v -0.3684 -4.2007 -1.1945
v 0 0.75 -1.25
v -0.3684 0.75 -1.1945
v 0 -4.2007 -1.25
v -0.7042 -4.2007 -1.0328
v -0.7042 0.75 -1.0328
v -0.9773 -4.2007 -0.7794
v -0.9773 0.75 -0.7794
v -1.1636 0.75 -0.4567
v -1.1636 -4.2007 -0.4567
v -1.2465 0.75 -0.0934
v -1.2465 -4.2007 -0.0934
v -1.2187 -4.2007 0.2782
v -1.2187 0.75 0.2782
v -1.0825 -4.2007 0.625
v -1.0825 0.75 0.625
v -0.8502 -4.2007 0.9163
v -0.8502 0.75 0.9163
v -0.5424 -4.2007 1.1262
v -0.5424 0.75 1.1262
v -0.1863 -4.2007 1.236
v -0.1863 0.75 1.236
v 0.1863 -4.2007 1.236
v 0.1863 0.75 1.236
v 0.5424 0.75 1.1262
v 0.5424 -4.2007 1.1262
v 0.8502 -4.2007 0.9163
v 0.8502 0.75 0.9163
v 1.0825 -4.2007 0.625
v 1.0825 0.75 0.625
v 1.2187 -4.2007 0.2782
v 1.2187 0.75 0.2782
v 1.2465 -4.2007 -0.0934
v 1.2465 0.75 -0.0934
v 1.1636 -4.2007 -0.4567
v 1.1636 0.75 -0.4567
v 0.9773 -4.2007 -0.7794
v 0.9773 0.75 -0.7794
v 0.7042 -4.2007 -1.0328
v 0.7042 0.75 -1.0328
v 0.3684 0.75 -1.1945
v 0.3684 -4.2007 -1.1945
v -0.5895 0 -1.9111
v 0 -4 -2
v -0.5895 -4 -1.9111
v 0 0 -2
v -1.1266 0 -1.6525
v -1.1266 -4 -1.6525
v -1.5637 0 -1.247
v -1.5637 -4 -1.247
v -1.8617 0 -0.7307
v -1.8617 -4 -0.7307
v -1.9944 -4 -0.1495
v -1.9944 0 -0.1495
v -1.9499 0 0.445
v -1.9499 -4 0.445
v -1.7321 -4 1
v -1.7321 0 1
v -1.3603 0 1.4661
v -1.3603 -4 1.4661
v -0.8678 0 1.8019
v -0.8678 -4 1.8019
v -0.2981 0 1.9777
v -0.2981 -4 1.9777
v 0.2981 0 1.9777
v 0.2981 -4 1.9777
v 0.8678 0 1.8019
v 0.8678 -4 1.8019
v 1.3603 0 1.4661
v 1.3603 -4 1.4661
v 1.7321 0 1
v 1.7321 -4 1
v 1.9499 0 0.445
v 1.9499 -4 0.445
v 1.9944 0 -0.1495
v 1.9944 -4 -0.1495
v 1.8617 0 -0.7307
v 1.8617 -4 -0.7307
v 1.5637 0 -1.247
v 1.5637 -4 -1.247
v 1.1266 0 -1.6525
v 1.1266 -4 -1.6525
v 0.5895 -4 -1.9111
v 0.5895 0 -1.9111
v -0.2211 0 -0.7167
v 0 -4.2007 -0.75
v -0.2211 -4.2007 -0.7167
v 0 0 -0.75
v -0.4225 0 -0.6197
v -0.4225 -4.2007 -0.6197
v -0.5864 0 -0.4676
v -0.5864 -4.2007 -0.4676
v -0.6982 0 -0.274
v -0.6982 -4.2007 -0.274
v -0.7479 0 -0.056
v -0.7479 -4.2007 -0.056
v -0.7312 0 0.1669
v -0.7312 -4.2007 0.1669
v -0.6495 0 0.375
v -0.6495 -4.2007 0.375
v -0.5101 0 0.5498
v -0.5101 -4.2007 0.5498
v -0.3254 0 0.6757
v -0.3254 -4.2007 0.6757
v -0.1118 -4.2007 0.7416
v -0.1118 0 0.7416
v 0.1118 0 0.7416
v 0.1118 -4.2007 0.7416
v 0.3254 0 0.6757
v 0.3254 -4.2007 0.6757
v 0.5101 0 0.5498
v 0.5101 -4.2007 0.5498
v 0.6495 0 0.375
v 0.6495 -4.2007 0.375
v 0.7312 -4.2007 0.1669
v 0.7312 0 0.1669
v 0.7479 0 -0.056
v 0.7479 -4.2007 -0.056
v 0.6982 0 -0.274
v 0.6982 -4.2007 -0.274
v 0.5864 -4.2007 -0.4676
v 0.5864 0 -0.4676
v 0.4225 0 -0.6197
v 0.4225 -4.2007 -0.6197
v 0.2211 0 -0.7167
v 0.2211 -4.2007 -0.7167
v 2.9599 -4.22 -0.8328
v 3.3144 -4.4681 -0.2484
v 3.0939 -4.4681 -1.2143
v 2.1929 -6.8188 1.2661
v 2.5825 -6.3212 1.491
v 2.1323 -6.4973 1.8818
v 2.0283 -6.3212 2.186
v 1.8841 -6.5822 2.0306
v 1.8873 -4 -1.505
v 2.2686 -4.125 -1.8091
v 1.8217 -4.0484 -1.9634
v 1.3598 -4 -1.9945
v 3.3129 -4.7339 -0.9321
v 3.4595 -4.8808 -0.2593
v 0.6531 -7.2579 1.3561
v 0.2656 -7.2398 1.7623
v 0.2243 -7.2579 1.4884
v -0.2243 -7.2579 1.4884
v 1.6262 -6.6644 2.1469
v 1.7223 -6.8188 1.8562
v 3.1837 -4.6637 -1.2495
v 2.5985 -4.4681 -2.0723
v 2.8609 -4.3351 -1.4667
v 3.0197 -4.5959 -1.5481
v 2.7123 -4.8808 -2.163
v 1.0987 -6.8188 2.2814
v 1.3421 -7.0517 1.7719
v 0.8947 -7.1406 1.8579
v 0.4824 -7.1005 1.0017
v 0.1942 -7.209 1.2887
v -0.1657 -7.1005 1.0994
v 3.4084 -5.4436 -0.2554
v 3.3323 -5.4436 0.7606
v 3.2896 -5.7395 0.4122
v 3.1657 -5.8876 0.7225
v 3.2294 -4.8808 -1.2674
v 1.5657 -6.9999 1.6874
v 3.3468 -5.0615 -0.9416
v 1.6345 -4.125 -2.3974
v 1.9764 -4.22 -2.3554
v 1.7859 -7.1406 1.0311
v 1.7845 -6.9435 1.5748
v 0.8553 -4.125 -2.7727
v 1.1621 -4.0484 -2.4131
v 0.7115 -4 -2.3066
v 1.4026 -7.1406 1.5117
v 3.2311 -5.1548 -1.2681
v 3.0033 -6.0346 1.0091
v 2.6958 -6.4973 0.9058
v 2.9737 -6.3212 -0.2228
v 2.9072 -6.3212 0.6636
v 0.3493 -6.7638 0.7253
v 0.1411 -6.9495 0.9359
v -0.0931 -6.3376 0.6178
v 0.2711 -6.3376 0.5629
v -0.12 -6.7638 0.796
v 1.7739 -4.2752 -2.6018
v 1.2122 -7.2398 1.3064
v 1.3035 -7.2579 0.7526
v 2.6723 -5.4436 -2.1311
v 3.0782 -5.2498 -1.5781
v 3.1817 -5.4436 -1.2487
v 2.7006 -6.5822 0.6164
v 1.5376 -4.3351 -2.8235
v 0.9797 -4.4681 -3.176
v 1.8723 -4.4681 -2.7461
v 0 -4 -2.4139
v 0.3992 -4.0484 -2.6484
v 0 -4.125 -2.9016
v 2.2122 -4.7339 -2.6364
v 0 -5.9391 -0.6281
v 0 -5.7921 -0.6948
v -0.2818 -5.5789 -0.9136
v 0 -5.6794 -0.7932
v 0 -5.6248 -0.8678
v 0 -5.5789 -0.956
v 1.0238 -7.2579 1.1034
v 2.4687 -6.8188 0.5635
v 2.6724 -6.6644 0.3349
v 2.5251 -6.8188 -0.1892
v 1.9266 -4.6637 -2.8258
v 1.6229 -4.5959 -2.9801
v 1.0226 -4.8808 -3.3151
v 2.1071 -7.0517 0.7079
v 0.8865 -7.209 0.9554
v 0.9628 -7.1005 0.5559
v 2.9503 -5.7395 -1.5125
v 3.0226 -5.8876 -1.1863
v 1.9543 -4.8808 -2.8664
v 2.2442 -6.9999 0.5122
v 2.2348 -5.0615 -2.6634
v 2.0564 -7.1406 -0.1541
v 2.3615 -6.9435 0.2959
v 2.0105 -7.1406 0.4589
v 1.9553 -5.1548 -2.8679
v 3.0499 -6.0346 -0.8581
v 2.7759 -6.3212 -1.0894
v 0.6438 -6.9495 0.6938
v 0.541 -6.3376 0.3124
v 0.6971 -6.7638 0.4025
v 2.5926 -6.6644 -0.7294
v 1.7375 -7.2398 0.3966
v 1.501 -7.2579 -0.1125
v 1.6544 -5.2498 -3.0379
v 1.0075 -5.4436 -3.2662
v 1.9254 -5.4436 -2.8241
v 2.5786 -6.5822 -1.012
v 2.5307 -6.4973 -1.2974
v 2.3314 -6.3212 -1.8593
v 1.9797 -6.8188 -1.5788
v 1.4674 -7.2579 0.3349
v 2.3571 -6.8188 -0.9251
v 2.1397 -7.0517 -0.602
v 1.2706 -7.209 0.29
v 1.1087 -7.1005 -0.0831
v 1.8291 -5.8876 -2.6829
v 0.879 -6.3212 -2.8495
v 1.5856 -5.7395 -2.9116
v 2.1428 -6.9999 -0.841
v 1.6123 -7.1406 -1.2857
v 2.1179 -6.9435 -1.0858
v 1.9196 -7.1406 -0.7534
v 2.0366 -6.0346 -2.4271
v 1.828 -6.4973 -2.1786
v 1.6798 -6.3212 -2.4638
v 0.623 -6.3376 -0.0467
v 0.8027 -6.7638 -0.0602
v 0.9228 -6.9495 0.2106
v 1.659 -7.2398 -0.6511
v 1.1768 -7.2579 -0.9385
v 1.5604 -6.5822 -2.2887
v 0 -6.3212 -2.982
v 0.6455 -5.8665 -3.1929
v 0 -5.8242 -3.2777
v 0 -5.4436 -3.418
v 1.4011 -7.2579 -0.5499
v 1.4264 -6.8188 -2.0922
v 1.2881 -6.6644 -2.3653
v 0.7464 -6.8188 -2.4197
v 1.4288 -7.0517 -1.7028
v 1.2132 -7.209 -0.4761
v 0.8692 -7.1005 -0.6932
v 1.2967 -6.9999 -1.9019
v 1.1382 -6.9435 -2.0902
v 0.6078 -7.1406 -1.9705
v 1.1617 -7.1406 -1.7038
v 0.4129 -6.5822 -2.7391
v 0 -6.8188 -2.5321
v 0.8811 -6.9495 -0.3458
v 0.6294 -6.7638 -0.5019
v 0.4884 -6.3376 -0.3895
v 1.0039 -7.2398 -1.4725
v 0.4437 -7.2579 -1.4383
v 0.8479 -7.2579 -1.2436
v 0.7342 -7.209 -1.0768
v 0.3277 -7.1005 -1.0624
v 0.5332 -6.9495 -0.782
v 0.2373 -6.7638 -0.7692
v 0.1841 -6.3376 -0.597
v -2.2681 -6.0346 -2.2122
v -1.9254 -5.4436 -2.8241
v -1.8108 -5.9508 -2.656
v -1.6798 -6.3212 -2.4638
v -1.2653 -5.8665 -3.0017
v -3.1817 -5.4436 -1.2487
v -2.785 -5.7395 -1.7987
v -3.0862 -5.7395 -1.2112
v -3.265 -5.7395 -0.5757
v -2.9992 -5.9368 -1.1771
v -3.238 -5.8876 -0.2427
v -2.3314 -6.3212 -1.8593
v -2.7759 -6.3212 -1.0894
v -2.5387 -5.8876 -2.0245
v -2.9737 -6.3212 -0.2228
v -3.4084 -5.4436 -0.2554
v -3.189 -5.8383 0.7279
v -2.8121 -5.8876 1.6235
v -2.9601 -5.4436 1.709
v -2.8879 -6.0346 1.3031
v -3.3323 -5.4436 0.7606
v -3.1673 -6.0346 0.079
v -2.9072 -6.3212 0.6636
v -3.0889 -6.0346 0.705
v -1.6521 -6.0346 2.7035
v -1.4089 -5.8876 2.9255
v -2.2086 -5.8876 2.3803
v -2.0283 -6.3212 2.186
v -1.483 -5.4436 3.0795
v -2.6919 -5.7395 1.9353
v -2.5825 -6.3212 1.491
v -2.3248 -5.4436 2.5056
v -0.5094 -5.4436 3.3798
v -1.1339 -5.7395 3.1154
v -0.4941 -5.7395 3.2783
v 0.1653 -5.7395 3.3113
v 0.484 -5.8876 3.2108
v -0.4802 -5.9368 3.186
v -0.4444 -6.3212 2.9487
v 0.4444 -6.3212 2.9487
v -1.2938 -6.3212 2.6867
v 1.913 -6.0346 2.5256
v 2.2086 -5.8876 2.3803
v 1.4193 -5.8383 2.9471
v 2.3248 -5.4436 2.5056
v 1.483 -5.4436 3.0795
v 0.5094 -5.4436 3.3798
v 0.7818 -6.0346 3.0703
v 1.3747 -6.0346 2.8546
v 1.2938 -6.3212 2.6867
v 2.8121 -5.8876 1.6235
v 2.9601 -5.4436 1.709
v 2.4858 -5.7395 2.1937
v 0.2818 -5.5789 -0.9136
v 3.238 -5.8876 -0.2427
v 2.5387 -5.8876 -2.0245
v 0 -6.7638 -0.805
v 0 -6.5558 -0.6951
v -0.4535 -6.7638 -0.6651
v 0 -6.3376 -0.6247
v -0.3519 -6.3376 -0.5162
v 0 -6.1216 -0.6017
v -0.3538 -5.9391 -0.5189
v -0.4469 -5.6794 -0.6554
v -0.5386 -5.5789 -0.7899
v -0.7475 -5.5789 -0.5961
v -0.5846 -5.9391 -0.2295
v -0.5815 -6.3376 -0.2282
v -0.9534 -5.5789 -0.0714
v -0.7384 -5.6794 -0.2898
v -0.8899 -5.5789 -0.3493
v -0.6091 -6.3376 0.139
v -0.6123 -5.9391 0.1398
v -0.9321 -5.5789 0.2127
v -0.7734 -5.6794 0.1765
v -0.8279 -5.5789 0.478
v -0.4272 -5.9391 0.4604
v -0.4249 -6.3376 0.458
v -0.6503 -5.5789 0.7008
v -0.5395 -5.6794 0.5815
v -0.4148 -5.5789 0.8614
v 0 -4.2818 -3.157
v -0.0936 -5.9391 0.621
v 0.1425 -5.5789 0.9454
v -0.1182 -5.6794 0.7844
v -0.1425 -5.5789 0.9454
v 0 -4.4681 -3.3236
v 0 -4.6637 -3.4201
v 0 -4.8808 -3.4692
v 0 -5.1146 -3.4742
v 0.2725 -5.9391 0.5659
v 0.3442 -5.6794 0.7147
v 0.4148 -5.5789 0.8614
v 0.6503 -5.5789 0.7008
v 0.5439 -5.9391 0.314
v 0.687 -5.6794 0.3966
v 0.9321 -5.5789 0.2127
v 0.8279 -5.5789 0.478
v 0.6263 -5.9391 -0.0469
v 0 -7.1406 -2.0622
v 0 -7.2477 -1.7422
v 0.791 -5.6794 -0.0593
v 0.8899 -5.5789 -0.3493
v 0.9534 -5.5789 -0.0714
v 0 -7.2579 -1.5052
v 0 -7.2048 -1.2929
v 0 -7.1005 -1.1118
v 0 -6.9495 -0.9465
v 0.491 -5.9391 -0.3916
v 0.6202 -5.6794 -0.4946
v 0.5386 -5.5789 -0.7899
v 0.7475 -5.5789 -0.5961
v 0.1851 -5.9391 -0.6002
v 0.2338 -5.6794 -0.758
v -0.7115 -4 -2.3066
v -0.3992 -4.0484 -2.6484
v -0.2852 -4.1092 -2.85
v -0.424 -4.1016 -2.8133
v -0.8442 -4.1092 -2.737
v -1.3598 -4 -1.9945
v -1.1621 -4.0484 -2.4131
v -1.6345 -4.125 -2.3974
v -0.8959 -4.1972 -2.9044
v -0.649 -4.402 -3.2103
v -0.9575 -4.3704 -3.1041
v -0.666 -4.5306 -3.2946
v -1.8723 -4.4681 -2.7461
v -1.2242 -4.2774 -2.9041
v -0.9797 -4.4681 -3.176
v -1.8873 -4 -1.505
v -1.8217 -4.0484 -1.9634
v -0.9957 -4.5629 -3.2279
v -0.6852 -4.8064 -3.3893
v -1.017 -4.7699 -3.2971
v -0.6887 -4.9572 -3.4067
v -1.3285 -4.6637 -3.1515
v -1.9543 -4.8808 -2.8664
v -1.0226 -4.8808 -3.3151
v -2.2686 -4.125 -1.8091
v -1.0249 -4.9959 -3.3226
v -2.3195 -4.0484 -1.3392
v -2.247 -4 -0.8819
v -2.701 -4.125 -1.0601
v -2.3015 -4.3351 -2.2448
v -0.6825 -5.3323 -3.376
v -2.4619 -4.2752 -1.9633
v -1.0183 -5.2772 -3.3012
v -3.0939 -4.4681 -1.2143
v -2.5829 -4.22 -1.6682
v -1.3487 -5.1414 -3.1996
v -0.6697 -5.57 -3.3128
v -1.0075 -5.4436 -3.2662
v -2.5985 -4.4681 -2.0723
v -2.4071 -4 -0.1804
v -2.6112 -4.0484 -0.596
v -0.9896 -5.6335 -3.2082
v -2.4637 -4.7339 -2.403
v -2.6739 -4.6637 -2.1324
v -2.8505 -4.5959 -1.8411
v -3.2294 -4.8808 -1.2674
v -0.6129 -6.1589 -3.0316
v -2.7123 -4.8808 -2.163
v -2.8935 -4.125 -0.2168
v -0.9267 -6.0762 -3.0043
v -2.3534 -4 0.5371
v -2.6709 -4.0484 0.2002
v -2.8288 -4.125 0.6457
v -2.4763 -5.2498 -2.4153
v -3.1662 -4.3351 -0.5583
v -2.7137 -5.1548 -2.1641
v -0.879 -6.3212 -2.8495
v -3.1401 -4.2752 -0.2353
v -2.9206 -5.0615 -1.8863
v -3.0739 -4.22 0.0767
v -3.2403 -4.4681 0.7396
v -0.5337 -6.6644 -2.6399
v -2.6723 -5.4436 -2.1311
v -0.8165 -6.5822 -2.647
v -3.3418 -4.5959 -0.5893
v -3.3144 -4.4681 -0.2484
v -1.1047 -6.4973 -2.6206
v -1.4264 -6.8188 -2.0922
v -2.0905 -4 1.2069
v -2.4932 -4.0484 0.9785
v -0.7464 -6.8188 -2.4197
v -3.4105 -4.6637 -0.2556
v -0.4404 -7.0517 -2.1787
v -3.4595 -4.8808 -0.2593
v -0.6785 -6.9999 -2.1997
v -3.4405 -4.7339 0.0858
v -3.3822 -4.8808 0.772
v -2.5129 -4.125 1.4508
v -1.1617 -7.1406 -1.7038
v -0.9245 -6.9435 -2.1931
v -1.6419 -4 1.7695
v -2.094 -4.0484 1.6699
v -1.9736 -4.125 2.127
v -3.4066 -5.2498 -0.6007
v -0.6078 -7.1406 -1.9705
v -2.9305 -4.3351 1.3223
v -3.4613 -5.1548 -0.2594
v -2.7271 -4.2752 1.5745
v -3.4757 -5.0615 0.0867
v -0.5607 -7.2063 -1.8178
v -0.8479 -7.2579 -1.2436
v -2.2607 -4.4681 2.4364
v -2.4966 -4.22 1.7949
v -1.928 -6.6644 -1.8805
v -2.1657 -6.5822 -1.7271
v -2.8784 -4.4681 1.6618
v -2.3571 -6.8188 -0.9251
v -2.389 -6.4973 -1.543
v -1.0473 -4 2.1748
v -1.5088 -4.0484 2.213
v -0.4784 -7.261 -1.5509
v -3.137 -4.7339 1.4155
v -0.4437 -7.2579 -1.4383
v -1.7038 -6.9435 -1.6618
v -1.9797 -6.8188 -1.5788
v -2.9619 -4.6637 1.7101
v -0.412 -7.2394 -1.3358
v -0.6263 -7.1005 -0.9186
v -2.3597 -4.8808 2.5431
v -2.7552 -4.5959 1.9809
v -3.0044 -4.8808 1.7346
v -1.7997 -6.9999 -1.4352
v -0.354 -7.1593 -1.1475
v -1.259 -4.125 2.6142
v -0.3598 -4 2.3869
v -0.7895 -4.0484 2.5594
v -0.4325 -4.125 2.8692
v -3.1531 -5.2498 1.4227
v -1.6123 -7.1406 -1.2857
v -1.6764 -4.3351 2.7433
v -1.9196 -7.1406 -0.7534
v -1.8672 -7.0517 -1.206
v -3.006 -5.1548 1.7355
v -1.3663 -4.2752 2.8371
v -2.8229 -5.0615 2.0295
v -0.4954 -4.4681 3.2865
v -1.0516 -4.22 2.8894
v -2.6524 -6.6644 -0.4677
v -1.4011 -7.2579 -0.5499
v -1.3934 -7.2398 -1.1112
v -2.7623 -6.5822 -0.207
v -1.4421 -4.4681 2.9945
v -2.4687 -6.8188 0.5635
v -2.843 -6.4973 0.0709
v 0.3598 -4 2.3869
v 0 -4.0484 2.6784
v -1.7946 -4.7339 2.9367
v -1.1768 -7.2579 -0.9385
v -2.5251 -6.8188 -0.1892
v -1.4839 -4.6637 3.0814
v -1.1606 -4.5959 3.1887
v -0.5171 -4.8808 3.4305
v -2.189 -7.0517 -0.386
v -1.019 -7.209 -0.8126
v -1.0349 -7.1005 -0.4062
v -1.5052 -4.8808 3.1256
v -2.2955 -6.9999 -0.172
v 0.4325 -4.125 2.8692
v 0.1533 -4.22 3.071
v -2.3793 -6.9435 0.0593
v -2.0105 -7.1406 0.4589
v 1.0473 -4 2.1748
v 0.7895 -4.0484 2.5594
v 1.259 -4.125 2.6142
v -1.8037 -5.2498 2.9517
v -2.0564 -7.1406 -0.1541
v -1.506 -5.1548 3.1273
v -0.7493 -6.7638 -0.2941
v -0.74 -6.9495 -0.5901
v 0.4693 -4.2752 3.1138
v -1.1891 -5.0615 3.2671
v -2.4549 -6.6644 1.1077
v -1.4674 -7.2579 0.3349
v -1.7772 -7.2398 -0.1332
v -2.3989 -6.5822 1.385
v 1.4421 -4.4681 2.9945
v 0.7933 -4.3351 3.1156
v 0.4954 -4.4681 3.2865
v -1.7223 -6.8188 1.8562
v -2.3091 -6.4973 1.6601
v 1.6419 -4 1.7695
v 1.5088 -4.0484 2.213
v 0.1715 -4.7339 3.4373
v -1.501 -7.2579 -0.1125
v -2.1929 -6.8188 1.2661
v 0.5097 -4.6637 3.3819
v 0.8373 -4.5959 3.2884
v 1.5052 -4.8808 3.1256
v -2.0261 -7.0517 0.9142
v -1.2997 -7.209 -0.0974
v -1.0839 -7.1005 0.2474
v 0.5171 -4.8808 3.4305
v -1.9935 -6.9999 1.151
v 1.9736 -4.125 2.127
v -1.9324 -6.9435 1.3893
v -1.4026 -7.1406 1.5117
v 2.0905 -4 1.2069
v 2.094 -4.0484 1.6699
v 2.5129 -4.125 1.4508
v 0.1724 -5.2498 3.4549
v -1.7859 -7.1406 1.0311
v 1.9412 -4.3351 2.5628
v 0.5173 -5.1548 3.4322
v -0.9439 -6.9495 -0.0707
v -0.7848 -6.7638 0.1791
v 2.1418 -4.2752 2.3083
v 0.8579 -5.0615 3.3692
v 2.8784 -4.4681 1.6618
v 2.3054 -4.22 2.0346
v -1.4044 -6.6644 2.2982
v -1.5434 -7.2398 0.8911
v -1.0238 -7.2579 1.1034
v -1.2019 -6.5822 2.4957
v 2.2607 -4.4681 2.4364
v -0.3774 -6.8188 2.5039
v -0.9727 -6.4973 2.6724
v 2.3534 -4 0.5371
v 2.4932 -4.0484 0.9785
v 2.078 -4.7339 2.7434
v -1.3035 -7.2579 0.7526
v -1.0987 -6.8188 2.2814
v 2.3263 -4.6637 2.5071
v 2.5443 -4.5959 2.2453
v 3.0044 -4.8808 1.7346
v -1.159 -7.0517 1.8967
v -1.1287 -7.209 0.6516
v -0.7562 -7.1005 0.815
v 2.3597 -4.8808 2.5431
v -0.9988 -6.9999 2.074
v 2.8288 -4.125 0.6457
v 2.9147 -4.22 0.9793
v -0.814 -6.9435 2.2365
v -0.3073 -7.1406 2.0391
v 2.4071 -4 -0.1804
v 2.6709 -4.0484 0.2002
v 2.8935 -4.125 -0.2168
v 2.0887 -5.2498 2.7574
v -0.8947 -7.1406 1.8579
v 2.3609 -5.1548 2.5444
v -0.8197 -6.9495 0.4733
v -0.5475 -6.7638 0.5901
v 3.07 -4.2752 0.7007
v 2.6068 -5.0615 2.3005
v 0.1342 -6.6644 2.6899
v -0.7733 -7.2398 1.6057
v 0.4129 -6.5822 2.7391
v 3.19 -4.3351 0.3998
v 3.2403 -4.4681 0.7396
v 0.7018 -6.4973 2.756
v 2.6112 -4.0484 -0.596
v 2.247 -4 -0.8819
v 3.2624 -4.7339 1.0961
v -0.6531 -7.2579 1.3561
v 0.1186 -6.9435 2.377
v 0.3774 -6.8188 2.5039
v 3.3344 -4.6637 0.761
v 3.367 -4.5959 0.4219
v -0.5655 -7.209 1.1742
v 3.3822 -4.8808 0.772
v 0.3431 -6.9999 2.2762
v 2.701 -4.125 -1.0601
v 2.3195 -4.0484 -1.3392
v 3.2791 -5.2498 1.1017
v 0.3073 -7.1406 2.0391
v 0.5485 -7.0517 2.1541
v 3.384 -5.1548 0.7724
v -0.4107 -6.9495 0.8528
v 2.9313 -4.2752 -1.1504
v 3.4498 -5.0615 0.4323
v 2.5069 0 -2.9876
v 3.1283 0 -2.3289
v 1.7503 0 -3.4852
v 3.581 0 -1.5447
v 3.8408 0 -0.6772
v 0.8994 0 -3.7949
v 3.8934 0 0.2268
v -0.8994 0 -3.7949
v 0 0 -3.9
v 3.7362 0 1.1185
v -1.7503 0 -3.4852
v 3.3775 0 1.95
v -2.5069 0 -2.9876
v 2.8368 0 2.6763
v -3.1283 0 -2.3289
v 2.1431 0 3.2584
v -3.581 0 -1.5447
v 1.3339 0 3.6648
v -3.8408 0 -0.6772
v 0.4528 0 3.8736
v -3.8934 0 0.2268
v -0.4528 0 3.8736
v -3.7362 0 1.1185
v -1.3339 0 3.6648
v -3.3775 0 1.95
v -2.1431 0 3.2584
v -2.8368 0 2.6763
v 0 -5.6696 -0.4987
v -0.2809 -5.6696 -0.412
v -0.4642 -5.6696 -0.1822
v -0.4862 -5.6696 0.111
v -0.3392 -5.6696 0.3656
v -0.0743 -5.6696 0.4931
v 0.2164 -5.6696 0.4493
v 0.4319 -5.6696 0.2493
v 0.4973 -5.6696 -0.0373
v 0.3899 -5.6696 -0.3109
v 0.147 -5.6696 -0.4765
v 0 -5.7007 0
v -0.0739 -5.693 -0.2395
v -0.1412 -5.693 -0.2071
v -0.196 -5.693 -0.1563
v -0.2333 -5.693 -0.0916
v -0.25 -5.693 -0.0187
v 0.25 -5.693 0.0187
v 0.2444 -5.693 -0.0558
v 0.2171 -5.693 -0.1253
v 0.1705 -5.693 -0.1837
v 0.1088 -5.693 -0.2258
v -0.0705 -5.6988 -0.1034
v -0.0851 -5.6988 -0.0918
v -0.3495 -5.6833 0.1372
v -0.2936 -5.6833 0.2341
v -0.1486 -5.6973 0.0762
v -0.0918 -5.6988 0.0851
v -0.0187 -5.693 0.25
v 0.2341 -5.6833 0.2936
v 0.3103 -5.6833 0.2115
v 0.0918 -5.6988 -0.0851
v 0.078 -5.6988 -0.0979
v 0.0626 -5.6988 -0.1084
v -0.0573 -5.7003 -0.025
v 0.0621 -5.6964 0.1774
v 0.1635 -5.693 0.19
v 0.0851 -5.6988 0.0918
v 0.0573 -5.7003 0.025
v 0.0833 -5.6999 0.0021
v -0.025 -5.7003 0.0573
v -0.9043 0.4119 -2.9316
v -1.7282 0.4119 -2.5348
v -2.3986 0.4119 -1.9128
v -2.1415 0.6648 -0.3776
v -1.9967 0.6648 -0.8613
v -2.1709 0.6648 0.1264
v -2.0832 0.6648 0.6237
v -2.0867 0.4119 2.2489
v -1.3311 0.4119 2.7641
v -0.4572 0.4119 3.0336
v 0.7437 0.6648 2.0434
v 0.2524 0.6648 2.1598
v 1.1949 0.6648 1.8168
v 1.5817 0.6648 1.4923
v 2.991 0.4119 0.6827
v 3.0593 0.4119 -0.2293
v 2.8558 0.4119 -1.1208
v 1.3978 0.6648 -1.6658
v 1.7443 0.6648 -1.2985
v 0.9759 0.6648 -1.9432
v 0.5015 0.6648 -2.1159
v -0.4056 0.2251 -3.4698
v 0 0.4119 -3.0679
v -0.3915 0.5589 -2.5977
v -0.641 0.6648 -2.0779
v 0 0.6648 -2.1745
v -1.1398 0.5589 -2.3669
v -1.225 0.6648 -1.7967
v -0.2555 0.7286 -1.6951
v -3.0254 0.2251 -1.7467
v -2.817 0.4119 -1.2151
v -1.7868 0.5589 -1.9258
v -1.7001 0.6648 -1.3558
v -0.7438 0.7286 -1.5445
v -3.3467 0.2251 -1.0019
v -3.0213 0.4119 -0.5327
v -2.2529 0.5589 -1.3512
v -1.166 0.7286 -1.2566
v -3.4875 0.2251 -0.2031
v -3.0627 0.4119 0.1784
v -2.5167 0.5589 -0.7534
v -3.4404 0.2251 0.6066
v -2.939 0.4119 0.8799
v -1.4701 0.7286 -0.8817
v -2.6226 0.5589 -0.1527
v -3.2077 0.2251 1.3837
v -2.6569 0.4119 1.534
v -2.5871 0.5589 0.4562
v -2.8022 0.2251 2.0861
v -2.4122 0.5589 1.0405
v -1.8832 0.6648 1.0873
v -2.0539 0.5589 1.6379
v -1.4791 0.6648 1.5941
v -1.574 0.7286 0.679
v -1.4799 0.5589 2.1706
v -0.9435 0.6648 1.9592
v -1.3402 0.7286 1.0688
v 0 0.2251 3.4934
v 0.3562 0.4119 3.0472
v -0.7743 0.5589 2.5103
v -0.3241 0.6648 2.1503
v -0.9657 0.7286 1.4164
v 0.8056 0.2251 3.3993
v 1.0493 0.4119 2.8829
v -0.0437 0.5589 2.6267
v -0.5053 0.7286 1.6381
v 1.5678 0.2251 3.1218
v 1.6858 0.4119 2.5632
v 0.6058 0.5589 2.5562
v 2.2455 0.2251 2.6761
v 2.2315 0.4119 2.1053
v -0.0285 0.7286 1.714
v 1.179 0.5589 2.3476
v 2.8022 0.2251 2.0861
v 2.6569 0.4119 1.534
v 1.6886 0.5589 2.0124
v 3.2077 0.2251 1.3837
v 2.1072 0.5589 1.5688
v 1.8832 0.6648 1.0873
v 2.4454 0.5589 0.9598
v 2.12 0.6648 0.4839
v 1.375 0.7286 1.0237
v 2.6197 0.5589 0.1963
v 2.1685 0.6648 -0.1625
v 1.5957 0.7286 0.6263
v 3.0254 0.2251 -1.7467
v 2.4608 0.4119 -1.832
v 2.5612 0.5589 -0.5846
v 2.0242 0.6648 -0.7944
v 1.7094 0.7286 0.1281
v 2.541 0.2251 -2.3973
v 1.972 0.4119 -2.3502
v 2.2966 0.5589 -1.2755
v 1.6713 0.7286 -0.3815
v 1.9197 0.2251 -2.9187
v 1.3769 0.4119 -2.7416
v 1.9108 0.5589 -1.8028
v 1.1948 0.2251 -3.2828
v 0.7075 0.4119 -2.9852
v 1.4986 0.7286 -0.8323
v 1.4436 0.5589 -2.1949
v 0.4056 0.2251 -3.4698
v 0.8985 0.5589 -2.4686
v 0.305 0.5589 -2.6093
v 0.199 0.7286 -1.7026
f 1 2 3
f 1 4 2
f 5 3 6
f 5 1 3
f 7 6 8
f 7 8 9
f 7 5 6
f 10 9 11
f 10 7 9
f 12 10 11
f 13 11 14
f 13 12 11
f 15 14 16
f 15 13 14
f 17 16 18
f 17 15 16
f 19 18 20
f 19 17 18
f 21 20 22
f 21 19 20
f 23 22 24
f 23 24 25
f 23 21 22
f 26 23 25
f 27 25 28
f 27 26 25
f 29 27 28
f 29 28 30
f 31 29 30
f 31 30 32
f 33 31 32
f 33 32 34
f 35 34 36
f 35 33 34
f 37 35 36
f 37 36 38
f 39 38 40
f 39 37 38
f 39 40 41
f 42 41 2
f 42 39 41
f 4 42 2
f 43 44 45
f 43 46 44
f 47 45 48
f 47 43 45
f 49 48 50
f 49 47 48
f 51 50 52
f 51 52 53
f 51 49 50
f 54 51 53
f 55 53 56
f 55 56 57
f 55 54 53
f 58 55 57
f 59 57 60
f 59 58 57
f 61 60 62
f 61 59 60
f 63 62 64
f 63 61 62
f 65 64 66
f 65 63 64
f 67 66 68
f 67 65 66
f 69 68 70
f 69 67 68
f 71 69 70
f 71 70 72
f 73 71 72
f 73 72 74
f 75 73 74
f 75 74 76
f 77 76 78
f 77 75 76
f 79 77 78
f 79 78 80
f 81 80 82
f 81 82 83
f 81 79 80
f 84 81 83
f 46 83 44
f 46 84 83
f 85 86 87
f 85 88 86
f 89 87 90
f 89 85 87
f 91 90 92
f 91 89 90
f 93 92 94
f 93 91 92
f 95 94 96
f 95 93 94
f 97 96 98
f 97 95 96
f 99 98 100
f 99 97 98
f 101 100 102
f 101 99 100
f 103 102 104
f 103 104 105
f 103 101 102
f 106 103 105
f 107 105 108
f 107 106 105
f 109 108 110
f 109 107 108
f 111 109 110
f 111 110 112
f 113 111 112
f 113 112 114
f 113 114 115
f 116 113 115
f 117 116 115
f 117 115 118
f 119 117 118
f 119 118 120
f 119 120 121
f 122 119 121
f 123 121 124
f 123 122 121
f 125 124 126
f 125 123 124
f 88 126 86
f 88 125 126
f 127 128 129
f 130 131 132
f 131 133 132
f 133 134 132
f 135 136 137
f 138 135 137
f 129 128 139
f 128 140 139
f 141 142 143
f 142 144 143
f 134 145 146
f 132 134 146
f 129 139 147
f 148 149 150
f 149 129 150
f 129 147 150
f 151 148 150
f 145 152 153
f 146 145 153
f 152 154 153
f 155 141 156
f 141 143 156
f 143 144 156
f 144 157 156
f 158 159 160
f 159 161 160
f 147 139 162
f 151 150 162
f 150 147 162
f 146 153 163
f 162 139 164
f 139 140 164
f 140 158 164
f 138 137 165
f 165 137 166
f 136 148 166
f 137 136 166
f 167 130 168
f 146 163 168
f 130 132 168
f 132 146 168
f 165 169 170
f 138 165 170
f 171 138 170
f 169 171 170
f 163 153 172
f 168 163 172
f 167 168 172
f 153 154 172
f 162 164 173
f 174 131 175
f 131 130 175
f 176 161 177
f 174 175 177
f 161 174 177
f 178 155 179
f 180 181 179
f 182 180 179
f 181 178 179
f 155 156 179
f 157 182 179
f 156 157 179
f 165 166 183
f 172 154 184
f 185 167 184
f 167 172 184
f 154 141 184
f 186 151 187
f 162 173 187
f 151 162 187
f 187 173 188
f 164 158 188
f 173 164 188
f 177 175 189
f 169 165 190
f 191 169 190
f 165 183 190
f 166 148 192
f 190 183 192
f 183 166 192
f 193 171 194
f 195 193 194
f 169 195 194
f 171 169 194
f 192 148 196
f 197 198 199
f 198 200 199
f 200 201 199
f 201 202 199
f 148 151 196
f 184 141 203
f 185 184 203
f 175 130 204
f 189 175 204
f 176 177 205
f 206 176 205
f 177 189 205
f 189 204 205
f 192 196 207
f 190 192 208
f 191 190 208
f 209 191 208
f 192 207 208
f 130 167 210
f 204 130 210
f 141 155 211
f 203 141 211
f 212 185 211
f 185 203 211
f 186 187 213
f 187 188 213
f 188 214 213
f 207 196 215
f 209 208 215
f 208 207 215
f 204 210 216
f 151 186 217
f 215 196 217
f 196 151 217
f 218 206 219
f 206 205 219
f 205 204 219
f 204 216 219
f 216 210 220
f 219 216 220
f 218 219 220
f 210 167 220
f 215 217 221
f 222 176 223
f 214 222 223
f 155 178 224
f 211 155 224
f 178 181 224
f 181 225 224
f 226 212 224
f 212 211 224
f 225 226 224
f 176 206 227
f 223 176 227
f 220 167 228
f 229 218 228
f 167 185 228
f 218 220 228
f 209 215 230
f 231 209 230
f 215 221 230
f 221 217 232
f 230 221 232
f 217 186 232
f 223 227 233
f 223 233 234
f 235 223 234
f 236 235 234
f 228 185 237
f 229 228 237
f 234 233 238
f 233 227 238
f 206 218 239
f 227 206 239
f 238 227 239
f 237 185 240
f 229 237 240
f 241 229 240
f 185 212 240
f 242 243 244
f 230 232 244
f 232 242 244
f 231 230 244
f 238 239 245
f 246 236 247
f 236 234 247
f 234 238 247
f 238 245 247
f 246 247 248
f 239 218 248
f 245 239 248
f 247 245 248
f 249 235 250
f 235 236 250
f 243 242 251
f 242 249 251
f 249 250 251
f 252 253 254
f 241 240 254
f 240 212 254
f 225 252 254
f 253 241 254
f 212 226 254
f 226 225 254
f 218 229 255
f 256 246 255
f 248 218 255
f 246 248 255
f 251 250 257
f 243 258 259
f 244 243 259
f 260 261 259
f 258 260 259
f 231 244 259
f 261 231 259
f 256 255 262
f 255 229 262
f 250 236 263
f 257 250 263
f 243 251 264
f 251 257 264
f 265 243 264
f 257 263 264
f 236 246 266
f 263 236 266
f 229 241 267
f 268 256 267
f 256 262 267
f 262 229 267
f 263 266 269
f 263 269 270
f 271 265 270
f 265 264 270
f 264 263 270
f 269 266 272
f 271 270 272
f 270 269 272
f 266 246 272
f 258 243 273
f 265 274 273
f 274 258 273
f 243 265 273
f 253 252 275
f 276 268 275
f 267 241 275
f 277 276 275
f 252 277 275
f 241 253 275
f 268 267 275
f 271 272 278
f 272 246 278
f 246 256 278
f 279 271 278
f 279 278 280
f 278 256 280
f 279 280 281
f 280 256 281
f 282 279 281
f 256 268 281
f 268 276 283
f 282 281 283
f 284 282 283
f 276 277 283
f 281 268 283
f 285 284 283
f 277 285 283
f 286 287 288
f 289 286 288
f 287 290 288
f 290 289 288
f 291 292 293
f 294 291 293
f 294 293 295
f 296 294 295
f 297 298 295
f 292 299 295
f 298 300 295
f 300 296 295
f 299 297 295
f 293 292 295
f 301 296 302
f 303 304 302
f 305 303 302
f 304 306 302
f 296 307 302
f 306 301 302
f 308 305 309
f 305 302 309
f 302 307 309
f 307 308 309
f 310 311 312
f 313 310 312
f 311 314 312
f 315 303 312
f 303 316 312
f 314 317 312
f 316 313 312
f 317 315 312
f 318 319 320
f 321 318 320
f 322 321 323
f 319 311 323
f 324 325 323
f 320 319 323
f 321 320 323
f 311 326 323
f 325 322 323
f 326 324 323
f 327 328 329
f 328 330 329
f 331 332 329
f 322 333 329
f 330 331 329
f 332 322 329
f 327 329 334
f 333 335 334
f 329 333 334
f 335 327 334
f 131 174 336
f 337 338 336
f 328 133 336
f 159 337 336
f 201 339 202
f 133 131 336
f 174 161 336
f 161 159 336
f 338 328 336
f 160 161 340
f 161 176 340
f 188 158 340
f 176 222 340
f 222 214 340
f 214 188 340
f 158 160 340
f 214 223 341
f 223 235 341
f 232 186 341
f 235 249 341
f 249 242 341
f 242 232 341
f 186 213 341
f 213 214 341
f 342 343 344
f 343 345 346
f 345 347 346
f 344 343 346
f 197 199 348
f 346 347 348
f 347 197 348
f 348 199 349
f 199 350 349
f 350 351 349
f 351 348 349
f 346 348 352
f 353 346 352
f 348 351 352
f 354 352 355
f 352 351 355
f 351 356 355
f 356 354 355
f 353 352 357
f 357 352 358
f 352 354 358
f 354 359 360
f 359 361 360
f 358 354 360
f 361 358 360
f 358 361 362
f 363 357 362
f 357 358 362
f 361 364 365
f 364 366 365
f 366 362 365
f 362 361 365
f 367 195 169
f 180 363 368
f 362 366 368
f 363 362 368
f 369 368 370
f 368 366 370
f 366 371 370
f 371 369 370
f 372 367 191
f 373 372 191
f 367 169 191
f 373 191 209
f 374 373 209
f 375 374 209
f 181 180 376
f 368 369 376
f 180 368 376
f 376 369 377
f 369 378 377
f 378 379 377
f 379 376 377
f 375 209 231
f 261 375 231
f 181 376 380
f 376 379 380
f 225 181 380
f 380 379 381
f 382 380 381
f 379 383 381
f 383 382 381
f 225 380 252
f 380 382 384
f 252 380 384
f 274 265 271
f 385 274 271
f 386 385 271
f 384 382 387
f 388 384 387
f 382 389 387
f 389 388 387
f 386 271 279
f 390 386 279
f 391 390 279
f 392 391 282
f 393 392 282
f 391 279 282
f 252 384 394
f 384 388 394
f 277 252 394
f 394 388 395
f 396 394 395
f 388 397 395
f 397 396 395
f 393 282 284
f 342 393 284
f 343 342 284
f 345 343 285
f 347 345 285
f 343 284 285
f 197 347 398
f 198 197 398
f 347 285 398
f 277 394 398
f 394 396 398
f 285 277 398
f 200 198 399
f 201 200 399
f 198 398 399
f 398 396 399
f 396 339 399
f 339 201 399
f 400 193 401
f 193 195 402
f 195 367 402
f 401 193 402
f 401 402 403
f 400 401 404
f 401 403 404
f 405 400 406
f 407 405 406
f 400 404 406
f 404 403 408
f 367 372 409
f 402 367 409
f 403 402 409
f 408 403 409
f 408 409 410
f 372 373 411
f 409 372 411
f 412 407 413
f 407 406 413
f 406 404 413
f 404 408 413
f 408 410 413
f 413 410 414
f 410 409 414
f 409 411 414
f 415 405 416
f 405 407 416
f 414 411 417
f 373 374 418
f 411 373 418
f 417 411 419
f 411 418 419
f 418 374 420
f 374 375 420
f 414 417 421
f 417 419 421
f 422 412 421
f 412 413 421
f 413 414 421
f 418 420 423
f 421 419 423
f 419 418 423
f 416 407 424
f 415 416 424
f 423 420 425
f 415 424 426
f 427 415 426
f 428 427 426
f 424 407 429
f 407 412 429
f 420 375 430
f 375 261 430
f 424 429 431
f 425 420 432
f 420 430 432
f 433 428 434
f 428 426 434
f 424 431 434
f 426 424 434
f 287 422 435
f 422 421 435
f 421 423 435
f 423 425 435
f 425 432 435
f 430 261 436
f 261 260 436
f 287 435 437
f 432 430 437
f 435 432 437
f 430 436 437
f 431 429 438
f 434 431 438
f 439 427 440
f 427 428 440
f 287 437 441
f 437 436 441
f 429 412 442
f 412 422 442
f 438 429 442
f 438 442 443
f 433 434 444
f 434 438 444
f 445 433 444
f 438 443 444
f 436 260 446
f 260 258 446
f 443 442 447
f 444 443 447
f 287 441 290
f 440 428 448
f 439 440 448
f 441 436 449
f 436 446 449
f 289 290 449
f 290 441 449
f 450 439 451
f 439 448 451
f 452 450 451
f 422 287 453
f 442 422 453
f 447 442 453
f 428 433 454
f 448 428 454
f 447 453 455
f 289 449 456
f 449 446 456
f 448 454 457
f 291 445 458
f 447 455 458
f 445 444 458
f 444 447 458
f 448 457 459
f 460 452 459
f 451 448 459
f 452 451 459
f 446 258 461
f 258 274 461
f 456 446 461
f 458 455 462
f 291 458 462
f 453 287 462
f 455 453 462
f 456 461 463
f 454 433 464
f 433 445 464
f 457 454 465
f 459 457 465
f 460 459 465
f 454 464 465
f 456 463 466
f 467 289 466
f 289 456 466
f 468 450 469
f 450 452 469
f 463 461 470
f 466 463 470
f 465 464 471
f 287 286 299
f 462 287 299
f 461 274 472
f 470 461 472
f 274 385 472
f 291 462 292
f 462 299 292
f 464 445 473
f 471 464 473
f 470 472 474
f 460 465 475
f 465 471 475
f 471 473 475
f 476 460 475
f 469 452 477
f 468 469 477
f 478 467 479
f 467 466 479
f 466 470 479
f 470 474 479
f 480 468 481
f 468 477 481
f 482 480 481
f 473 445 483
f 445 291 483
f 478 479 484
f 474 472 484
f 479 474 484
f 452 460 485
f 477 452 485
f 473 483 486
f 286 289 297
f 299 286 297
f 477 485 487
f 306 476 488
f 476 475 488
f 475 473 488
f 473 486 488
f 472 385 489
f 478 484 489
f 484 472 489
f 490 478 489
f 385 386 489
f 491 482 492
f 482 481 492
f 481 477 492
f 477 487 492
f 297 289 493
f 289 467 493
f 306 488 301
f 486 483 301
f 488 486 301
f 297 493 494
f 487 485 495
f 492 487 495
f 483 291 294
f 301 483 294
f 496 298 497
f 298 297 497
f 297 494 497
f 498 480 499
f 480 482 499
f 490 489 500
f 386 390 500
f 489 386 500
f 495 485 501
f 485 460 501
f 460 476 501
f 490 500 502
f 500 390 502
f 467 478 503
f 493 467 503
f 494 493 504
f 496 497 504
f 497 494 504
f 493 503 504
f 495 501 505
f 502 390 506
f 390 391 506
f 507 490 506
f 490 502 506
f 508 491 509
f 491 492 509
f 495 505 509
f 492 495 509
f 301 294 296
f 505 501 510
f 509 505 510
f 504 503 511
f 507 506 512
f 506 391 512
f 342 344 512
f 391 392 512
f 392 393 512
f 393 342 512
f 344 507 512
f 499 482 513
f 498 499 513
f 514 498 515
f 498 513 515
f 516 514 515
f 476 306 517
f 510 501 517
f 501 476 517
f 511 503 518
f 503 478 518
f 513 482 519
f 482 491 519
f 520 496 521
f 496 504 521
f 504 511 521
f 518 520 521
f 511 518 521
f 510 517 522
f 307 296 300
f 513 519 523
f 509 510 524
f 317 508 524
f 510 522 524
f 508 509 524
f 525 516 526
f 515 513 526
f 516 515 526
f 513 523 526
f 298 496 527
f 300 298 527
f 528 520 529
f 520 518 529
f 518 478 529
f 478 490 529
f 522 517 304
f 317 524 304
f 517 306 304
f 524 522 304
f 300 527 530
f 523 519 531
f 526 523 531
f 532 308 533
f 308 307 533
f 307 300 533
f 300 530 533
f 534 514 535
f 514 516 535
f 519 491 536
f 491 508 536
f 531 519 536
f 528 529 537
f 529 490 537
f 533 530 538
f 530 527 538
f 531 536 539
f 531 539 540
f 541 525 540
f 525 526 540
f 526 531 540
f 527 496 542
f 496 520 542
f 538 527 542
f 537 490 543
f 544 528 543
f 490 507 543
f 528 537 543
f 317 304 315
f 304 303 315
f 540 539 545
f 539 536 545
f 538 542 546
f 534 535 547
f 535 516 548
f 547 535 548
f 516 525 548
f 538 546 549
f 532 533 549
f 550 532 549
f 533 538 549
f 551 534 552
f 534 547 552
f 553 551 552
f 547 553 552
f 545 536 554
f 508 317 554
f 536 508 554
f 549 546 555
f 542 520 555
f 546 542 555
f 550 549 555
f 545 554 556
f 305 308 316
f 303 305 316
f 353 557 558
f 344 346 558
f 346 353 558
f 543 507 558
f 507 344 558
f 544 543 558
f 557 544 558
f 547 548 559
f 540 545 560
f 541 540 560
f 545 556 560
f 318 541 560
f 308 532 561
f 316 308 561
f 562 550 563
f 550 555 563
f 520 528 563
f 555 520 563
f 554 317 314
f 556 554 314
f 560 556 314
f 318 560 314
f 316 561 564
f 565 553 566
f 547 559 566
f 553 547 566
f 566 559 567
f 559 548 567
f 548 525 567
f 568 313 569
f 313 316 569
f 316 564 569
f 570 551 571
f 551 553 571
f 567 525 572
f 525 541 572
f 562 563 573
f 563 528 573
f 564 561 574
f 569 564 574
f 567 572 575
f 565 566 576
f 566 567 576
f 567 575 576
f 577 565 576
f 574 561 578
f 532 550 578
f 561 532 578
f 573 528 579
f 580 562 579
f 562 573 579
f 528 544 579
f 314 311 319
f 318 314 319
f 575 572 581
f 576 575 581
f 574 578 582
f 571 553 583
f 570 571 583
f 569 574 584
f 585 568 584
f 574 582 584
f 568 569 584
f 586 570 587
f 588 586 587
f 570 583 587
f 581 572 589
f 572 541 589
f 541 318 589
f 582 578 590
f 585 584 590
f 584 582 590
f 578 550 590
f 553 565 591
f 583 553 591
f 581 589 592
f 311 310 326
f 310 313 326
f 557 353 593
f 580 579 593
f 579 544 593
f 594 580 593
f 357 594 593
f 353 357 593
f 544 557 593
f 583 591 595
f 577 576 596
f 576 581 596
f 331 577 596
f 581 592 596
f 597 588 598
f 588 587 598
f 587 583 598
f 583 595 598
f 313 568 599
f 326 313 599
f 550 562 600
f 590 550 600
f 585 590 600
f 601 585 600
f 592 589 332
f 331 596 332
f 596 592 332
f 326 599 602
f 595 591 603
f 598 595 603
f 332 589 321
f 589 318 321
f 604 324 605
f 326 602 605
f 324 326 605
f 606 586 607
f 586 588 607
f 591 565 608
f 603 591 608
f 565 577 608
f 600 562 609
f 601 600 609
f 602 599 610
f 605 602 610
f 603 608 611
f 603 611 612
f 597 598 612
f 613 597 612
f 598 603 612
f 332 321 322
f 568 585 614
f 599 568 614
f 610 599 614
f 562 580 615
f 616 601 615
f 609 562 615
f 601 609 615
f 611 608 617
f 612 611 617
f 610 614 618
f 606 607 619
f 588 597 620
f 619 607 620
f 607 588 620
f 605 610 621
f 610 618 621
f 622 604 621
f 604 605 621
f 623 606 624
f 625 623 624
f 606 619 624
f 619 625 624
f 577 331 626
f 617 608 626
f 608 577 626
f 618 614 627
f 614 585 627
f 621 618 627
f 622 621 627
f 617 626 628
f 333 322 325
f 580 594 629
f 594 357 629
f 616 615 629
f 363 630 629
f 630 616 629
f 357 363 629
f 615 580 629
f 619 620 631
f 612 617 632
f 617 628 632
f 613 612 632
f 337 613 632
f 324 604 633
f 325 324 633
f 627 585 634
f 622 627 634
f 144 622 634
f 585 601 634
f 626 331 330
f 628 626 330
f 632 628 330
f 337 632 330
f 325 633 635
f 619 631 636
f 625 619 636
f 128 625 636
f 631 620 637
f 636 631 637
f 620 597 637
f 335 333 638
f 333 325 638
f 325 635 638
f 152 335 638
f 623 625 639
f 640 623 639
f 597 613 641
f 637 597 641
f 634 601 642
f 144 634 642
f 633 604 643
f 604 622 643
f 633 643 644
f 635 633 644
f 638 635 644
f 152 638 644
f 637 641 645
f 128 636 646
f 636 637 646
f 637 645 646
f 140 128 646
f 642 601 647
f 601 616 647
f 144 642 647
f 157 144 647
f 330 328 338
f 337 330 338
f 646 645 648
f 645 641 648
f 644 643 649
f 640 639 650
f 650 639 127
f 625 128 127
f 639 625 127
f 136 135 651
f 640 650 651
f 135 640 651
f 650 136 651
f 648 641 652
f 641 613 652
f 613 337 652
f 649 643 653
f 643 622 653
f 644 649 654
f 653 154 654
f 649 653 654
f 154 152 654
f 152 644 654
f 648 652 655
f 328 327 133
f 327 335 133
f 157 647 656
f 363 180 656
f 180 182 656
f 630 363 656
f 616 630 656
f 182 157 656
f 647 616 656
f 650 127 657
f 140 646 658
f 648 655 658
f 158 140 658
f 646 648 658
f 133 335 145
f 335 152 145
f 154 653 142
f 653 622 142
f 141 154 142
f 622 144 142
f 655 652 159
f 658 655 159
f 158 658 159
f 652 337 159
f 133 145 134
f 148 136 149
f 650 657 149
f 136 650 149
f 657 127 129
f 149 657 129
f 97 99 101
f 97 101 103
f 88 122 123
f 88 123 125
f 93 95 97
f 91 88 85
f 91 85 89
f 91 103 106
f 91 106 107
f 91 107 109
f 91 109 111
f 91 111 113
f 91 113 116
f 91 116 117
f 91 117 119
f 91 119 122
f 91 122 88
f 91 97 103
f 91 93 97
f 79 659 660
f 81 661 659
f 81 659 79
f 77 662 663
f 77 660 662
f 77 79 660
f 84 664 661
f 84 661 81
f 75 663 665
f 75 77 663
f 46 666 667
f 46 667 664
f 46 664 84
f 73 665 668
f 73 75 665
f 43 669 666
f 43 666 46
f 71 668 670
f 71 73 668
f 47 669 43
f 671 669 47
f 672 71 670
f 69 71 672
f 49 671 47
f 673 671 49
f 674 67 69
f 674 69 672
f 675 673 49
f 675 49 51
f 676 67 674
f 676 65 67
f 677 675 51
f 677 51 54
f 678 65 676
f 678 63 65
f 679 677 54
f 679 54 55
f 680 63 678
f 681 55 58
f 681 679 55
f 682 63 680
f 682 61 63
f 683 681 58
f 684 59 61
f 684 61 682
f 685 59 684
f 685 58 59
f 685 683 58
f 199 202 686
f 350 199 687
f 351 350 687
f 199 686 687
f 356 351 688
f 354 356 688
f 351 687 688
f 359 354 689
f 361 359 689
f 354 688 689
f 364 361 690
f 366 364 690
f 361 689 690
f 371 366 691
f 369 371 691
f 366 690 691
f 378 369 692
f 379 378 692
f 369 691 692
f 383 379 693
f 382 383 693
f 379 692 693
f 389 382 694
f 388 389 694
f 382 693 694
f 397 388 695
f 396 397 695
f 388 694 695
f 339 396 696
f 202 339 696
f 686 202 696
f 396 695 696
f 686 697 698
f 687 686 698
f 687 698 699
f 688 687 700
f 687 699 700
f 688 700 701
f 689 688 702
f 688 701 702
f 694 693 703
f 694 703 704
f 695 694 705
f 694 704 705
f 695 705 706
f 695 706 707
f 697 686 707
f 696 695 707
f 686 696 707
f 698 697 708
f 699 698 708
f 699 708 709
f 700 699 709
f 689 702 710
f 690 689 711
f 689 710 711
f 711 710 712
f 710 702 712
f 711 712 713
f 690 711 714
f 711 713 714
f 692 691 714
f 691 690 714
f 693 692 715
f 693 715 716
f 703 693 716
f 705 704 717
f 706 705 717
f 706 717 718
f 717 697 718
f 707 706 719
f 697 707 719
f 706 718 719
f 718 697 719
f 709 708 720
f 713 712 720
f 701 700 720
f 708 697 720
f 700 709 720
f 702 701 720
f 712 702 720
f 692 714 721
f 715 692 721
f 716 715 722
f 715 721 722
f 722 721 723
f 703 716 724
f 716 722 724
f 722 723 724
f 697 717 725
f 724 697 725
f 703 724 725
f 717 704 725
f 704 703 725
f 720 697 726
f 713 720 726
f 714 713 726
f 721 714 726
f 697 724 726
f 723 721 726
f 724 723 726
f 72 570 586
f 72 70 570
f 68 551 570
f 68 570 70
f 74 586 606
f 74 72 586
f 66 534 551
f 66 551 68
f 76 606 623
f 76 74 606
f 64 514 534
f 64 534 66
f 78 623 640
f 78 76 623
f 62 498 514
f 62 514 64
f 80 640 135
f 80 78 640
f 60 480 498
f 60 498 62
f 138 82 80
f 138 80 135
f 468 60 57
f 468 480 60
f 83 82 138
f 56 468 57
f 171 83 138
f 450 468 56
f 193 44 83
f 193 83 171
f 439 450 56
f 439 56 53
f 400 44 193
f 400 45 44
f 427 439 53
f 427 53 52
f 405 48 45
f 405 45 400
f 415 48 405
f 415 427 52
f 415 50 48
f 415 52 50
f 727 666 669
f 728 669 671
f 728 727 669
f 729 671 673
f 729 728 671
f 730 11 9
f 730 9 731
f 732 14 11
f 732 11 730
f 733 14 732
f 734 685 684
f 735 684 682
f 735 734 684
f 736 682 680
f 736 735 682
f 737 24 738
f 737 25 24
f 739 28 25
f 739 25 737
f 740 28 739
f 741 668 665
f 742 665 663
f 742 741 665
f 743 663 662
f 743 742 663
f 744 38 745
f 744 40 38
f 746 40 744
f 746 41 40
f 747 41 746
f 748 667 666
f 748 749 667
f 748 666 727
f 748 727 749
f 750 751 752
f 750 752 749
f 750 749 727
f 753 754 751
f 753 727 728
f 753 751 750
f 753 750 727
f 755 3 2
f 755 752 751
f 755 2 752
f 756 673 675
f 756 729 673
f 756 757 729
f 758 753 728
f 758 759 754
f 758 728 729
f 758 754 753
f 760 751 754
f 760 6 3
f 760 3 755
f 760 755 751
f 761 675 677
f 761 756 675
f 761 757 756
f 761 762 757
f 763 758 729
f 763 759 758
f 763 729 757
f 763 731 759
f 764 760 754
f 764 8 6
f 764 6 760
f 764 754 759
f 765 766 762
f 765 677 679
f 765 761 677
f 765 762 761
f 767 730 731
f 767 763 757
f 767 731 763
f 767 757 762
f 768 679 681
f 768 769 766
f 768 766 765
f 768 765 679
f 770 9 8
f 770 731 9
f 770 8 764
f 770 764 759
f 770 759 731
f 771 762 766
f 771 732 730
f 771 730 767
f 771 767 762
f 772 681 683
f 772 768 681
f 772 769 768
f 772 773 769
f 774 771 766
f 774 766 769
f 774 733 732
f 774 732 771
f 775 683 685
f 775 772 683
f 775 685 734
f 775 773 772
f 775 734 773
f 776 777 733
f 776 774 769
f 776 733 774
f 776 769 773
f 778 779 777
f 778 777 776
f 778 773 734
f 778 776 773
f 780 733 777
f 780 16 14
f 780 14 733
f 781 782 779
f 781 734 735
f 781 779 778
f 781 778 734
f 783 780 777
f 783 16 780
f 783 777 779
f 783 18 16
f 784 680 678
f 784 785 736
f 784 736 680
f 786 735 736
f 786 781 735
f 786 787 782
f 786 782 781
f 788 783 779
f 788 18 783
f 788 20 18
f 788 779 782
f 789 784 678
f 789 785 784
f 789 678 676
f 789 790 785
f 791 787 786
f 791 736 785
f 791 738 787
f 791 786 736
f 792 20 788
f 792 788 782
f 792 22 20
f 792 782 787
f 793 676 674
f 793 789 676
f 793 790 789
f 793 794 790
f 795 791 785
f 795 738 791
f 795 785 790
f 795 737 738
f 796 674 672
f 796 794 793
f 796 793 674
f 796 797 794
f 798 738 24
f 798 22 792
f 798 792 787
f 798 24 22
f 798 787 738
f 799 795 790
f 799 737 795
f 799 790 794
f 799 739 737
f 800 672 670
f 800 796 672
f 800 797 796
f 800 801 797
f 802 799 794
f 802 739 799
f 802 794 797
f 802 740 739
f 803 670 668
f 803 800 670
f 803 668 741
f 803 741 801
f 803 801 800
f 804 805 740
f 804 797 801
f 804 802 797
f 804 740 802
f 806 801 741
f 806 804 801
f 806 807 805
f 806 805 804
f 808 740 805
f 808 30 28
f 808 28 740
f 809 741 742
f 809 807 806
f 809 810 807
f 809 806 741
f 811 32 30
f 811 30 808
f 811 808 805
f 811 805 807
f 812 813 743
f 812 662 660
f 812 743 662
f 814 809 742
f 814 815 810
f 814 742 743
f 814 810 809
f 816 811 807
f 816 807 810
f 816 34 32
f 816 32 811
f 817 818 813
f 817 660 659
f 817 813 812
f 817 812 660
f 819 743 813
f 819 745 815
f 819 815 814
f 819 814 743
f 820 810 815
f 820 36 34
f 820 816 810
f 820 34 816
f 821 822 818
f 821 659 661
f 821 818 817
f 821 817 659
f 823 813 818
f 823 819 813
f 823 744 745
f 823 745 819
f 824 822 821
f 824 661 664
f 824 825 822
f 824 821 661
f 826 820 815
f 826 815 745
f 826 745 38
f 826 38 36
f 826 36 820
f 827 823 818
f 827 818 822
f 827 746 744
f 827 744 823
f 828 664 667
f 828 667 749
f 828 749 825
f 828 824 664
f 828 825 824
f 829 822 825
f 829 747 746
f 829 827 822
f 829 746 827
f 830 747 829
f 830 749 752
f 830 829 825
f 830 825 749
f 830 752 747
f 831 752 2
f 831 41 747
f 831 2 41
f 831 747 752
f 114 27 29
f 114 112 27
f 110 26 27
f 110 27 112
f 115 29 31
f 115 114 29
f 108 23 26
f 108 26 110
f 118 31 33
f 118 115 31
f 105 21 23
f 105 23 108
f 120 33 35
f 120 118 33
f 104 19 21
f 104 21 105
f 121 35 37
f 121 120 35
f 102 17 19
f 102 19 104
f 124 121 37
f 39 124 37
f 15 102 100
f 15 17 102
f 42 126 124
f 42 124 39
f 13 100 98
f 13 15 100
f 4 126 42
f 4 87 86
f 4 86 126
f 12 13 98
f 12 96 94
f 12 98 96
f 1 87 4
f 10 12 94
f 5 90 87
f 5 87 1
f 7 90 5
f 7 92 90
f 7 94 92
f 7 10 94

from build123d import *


with BuildPart() as part:
    # Szkic1 → Obrót1 (revolve)
    with BuildSketch(Plane(origin=(0, 0, 0), x_dir=(0, 0, -1), z_dir=(1, 0, 0)), mode=Mode.PRIVATE) as obr_t1_sk:
        with BuildLine():
            Line((0, 0), (0, -4.121746268))
            Line((0, -4.121746268), (0, -4.200738523))
            Line((0, -4.200738523), (0, -5.700738523))
            add(Edge.make_bspline(
                [(-0.956030427, -5.578929194), (-0.520263876, -5.700738523), (0, -5.700738523)],
                knots=[0.992852221, 0.992852221, 0.992852221, 1.570796327, 1.570796327, 1.570796327], degree=2, weights=[1, 0.958537313, 1]))
            add(Edge.make_bspline(
                [(-2.413891755, -4), (-3.867503112, -4.169657322), (-3.528877649, -6.302013626), (-1.083961642, -7.873532369), (-0.271752618, -5.874949298), (-0.956030427, -5.578929194)],
                knots=[0, 0, 0, 0, 0.464993082, 0.721927553, 1, 1, 1, 1], degree=3))
            Line((-2.413891755, -4), (-2, -4))
            Line((-2, -4), (-2, 0))
            Line((-2, 0), (-3.9, 0))
            ThreePointArc((-3.9, 0), (-2.627043935, 0.558888572), (-1.25, 0.75))
            Line((-1.25, 0.75), (-1.25, -4.200738523))
            Line((-1.25, -4.200738523), (-0.75, -4.200738523))
            Line((-0.75, -4.200738523), (-0.75, 0))
            Line((-0.75, 0), (0, 0))
        make_face()
    revolve(obr_t1_sk.sketch.rotate(Axis((0, 0, 0), (0, 1, 0)), 180), axis=Axis((0, 0, 0), (0, 1, 0)))


solid = part.part
